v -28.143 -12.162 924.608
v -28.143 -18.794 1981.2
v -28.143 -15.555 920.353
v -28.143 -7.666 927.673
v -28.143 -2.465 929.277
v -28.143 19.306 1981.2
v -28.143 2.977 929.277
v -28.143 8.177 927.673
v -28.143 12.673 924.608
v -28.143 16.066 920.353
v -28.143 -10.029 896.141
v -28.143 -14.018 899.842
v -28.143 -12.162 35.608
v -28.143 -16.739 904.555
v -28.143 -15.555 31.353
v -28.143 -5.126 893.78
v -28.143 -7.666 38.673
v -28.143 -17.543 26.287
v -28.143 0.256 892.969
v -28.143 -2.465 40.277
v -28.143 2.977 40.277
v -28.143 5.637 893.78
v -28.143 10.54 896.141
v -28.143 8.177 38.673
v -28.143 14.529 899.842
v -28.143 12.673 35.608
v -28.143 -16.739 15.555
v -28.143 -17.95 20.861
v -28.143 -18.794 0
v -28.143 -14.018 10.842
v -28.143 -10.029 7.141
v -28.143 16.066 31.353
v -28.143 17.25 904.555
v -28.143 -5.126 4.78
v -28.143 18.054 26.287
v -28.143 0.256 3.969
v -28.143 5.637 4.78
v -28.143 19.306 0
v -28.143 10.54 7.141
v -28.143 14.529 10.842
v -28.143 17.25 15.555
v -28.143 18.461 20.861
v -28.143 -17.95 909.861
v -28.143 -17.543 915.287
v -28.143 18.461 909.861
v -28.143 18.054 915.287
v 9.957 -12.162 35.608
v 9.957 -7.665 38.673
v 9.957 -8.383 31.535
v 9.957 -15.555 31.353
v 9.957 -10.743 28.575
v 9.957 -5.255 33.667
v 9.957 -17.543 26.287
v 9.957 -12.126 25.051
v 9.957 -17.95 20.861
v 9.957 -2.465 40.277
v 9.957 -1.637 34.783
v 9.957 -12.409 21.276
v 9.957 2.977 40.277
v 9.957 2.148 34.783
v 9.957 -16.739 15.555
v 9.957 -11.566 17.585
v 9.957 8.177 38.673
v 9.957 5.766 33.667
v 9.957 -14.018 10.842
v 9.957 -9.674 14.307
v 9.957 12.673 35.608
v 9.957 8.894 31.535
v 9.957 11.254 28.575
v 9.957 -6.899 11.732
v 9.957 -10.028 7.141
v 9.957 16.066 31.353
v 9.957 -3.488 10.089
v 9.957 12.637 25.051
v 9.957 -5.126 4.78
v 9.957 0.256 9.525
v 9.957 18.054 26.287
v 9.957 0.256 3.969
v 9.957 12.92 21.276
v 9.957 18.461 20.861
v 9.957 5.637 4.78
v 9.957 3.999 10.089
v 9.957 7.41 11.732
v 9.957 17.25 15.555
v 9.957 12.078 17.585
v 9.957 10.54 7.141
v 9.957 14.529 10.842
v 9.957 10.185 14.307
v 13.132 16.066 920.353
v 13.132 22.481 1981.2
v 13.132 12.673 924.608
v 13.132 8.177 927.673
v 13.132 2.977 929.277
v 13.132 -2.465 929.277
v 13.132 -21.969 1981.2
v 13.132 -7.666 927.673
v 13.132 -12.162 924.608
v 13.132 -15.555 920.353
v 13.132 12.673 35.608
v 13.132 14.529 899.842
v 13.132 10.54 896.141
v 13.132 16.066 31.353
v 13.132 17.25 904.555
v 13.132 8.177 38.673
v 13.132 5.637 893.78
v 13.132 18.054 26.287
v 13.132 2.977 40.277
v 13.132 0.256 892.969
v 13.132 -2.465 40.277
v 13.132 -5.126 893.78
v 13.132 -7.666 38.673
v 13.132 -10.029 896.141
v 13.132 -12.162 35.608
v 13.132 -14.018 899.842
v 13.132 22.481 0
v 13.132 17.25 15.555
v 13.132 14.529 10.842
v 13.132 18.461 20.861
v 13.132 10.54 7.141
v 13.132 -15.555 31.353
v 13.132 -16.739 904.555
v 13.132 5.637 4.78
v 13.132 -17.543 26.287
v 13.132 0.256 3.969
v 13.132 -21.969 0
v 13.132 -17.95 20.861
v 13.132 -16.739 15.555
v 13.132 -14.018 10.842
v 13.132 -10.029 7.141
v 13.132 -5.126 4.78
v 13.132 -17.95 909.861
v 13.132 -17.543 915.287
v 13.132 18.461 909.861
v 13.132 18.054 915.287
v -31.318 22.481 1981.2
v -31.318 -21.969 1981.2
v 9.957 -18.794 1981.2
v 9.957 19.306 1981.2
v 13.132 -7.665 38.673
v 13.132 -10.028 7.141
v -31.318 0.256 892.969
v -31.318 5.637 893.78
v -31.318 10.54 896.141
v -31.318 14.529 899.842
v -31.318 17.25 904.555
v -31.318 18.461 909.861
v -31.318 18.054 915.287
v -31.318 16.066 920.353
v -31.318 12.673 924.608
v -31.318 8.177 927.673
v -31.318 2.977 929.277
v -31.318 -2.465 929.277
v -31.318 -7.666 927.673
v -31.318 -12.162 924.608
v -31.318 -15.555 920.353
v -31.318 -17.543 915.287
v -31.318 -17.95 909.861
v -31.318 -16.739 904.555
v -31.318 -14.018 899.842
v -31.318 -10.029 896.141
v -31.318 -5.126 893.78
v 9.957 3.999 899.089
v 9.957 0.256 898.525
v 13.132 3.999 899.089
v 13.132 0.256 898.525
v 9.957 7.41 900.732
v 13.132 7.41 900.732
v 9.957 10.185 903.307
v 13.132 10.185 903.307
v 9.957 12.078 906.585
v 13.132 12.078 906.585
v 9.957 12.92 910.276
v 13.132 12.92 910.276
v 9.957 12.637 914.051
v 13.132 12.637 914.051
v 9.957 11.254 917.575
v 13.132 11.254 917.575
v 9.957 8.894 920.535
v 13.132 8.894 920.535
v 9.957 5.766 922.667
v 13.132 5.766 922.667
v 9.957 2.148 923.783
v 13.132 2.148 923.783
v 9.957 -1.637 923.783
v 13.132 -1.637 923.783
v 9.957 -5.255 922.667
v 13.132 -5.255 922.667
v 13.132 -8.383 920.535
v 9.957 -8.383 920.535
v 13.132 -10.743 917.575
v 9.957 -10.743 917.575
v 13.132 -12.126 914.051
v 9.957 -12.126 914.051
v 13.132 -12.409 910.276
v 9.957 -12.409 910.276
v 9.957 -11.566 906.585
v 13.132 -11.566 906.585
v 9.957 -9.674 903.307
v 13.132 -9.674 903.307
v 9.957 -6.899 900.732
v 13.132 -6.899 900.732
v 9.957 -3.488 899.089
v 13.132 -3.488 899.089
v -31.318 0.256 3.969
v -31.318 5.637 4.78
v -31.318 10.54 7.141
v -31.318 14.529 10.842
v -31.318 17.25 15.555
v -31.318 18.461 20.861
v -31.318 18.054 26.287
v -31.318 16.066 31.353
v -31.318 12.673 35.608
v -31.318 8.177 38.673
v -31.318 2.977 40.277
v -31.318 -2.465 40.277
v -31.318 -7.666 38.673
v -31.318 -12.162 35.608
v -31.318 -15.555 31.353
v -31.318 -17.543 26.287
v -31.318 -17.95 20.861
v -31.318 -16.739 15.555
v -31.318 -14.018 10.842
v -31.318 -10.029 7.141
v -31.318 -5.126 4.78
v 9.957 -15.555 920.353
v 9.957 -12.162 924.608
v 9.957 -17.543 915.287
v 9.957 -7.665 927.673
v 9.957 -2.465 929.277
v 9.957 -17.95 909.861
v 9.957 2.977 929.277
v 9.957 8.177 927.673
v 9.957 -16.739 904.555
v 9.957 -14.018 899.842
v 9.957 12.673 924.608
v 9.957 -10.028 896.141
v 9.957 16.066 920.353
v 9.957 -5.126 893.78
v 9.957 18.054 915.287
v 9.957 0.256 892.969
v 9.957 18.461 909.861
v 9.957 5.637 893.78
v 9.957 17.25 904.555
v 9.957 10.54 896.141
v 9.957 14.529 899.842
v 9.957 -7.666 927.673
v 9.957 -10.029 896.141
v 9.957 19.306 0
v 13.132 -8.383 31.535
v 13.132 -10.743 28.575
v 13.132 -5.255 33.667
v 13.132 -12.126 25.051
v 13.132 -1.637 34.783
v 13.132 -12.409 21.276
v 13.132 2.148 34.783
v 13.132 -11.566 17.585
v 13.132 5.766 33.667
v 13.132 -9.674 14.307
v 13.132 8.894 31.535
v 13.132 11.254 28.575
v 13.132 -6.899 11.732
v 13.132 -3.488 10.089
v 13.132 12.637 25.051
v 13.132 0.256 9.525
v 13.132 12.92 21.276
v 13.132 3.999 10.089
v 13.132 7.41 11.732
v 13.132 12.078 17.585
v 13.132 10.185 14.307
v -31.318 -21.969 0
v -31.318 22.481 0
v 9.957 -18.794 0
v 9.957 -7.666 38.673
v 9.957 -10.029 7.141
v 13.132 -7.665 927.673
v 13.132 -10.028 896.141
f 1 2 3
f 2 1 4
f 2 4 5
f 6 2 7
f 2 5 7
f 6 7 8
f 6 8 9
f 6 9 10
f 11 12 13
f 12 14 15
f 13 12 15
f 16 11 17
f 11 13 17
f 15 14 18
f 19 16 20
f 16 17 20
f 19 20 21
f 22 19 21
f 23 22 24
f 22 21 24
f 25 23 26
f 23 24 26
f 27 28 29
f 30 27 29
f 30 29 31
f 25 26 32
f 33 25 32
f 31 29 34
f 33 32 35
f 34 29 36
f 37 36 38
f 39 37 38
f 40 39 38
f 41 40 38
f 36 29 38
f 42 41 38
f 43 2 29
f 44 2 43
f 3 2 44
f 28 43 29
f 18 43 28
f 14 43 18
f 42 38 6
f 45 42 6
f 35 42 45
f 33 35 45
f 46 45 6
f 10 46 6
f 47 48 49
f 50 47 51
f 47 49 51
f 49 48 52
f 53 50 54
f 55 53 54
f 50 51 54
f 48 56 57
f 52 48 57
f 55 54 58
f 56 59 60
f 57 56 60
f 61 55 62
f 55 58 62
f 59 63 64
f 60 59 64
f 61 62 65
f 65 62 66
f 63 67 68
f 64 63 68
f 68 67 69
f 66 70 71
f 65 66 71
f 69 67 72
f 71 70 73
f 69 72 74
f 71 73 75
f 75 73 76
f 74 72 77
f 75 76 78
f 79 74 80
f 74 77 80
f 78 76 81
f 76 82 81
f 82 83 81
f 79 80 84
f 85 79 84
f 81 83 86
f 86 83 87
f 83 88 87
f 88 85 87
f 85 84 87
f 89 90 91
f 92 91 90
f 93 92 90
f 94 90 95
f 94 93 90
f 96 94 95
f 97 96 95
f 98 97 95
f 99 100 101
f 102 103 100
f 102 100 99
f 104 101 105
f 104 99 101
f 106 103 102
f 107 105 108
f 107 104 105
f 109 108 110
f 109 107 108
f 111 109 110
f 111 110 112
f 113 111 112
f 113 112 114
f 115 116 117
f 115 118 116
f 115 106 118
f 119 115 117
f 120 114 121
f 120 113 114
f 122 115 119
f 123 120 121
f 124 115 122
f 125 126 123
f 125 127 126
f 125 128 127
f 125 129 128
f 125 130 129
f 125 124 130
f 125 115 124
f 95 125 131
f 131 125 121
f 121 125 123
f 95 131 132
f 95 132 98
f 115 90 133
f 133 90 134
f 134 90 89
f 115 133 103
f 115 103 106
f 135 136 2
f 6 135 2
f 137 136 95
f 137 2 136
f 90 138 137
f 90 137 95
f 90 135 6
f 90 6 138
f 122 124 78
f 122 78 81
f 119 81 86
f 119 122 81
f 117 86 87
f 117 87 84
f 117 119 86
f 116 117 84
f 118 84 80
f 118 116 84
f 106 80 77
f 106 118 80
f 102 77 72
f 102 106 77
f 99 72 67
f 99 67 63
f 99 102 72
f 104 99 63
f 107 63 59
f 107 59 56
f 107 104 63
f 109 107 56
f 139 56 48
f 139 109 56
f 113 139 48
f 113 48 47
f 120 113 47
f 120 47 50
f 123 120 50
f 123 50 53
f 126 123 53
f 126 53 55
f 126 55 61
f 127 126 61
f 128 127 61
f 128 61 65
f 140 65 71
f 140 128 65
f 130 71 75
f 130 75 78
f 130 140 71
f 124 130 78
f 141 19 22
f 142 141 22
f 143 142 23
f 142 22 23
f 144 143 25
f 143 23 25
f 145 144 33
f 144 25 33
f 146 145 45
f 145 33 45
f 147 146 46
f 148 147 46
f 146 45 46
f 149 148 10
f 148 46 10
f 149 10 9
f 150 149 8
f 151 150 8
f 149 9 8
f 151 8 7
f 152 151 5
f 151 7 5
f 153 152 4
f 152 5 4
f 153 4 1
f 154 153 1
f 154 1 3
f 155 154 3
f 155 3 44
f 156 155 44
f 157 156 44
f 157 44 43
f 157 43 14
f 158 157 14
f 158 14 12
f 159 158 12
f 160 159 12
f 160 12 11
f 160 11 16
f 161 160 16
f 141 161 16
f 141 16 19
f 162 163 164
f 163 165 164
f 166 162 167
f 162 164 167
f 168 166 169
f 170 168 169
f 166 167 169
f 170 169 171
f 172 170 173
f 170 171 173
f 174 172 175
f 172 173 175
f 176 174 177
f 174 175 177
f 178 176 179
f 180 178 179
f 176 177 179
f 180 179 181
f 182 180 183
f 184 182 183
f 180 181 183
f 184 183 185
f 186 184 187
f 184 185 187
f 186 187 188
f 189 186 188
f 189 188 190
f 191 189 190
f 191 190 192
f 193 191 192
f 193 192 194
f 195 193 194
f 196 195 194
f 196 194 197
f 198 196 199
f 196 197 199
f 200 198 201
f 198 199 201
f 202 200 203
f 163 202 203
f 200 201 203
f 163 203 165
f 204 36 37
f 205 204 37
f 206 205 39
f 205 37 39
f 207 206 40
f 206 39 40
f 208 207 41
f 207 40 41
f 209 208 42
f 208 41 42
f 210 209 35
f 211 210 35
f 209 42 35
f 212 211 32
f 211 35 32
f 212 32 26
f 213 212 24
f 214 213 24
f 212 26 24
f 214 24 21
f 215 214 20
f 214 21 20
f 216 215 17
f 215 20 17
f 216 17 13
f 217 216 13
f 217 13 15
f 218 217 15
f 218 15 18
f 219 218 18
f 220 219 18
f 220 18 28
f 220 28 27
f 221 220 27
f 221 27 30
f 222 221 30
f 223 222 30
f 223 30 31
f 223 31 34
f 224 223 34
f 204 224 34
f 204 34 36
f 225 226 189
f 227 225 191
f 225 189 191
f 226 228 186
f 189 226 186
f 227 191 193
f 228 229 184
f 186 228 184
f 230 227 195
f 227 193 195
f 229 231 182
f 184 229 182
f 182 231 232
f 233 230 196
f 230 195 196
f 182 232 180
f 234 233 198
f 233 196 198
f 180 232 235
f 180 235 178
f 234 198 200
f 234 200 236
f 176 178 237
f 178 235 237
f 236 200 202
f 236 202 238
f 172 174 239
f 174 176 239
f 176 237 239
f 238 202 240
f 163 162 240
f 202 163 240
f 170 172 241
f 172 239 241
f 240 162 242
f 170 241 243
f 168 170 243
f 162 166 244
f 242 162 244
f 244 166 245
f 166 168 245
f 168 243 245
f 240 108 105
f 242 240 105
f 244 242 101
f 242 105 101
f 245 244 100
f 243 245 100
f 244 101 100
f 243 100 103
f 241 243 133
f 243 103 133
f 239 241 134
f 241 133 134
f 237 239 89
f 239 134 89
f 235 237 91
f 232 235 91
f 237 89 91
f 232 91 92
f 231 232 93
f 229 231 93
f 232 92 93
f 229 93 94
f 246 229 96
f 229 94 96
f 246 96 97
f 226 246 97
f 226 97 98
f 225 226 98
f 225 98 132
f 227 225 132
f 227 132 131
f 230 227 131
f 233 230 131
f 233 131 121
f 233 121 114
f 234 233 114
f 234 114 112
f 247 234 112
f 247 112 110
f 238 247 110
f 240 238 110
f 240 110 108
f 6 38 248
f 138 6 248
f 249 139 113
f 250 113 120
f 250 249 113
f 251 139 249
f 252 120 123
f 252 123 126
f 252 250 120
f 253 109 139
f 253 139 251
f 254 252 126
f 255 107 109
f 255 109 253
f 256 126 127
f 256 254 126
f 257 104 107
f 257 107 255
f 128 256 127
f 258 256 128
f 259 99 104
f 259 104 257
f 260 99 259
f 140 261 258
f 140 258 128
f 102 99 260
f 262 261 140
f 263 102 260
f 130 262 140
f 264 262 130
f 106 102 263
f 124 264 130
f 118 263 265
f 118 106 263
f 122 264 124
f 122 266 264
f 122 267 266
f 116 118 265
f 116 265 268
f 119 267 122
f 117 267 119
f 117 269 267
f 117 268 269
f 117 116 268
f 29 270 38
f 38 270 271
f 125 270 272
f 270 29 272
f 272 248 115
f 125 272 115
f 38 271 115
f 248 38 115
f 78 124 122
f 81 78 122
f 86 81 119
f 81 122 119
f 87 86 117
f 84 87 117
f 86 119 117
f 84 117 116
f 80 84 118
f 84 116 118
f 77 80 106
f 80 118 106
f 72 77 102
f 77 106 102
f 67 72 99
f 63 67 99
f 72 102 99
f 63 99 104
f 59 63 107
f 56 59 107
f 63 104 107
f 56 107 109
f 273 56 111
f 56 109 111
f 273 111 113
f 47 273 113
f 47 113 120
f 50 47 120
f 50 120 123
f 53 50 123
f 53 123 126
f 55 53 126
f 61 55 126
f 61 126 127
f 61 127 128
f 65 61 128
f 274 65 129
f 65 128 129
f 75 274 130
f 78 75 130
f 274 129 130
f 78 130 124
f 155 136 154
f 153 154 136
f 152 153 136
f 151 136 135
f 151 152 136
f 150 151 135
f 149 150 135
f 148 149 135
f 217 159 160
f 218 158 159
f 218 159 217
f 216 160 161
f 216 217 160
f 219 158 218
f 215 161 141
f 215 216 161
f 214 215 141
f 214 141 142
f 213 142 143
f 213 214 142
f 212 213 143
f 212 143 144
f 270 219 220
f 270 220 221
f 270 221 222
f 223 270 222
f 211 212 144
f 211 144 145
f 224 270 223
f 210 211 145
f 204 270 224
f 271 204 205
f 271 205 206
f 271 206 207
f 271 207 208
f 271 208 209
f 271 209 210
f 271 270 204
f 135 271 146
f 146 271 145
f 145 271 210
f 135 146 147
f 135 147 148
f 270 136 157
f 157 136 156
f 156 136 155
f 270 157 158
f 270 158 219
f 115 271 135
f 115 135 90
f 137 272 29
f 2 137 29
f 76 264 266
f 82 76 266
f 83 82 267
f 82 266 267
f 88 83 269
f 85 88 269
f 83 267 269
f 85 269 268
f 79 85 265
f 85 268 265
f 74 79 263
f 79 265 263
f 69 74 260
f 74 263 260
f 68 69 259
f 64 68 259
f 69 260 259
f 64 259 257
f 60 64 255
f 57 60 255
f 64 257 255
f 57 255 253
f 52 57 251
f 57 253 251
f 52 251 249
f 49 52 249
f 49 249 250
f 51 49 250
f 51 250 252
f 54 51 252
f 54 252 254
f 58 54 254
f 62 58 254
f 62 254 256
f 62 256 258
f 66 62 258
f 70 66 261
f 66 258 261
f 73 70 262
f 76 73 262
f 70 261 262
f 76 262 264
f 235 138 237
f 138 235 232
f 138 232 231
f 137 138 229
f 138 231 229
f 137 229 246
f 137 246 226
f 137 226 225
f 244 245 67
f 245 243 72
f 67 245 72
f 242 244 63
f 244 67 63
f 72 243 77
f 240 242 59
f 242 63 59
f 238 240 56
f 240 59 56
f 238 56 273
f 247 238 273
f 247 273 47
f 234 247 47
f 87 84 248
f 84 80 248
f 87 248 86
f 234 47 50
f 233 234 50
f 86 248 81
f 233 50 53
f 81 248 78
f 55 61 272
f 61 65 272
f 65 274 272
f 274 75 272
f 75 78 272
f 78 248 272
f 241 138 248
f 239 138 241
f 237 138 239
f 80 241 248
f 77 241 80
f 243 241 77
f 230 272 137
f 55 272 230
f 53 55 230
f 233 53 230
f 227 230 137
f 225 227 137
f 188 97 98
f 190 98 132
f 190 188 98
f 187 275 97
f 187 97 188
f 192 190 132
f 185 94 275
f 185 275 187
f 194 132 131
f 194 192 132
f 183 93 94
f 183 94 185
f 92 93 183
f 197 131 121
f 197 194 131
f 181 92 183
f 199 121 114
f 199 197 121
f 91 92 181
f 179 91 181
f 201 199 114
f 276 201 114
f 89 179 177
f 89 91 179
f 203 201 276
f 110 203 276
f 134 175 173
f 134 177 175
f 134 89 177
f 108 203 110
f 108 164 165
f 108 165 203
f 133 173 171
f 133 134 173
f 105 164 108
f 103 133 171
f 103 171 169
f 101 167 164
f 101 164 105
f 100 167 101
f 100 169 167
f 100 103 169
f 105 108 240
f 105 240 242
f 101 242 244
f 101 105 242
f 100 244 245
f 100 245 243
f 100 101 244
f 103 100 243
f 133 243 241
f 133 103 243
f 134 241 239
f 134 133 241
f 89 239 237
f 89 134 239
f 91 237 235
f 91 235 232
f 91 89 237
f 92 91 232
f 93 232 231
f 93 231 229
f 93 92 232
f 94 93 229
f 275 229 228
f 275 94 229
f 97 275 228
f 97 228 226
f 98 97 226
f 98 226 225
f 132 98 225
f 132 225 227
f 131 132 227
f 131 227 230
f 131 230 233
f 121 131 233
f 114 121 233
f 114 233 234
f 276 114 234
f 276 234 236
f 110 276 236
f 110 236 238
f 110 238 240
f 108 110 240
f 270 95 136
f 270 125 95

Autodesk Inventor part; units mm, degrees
ref_plane "YZ Plane" through (0, 0, 0) normal (1, 0, 0) x (0, 1, 0)
ref_plane "XZ Plane" through (0, 0, 0) normal (0, 1, 0) x (-1, 0, 0)
ref_plane "XY Plane" through (0, 0, 0) normal (0, 0, 1) x (1, 0, 0)
sketch "Sketch1" plane through (0, 0, 0) normal (0, 0, 1) x (1, 0, 0)
  line L0 (-31.3178, 22.4806) -> (13.1322, 22.4806)
  line L1 (13.1322, 22.4806) -> (13.1322, -21.9694)
  line L2 (13.1322, -21.9694) -> (-31.3178, -21.9694)
  line L3 (-31.3178, -21.9694) -> (-31.3178, 22.4806)
  dimension "d0" = 44.45
  dimension "d1" = 44.45
extrude "Extrusion1" add sketch "Sketch1" along normal blind 1981.2
shell "Shell1" thickness 3.175 removed faces 2 at (-16.5012, 7.664, 0) at (-16.5012, 7.664, 1981.2)
sketch "Sketch2" plane through (13.1322, -21.9694, 0) normal (1, 0, 0) x (0, 0, -1)
  line L0 (0, 44.45) -> (0, 0) projected
  line L1 (0, 44.45) -> (-1981.2, 44.45) projected
  circle A0 centre (-911.225, 22.225) radius 18.2563
  circle A1 centre (-22.225, 22.225) radius 18.2563
  dimension "d5" = 36.5125
  dimension "d6" = 44.45
  dimension "d7" = 22.225
  dimension "d16" = 36.5125
  dimension "d17" = 22.225
  dimension "d18" = 889
extrude "Extrusion2" cut sketch "Sketch2" against normal through all
sketch "Sketch4" plane through (13.1322, -21.9694, 0) normal (1, 0, 0) x (0, 0, -1)
  circle A0 centre (-911.225, 22.225) radius 18.2562 projected
  circle A1 centre (-911.225, 22.225) radius 12.7
  circle A2 centre (-22.225, 22.225) radius 18.2562 projected
  circle A3 centre (-22.225, 22.225) radius 12.7
  dimension "d20" = 25.4
  dimension "d23" = 25.4
extrude "Extrusion4" add sketch "Sketch4" against normal blind 3.175
equation "\"d1\" = d0"
equation "\"d7\" = 0.5 * d6"
equation "\"d16\" = d5"
properties part number "FE-00002-05"
